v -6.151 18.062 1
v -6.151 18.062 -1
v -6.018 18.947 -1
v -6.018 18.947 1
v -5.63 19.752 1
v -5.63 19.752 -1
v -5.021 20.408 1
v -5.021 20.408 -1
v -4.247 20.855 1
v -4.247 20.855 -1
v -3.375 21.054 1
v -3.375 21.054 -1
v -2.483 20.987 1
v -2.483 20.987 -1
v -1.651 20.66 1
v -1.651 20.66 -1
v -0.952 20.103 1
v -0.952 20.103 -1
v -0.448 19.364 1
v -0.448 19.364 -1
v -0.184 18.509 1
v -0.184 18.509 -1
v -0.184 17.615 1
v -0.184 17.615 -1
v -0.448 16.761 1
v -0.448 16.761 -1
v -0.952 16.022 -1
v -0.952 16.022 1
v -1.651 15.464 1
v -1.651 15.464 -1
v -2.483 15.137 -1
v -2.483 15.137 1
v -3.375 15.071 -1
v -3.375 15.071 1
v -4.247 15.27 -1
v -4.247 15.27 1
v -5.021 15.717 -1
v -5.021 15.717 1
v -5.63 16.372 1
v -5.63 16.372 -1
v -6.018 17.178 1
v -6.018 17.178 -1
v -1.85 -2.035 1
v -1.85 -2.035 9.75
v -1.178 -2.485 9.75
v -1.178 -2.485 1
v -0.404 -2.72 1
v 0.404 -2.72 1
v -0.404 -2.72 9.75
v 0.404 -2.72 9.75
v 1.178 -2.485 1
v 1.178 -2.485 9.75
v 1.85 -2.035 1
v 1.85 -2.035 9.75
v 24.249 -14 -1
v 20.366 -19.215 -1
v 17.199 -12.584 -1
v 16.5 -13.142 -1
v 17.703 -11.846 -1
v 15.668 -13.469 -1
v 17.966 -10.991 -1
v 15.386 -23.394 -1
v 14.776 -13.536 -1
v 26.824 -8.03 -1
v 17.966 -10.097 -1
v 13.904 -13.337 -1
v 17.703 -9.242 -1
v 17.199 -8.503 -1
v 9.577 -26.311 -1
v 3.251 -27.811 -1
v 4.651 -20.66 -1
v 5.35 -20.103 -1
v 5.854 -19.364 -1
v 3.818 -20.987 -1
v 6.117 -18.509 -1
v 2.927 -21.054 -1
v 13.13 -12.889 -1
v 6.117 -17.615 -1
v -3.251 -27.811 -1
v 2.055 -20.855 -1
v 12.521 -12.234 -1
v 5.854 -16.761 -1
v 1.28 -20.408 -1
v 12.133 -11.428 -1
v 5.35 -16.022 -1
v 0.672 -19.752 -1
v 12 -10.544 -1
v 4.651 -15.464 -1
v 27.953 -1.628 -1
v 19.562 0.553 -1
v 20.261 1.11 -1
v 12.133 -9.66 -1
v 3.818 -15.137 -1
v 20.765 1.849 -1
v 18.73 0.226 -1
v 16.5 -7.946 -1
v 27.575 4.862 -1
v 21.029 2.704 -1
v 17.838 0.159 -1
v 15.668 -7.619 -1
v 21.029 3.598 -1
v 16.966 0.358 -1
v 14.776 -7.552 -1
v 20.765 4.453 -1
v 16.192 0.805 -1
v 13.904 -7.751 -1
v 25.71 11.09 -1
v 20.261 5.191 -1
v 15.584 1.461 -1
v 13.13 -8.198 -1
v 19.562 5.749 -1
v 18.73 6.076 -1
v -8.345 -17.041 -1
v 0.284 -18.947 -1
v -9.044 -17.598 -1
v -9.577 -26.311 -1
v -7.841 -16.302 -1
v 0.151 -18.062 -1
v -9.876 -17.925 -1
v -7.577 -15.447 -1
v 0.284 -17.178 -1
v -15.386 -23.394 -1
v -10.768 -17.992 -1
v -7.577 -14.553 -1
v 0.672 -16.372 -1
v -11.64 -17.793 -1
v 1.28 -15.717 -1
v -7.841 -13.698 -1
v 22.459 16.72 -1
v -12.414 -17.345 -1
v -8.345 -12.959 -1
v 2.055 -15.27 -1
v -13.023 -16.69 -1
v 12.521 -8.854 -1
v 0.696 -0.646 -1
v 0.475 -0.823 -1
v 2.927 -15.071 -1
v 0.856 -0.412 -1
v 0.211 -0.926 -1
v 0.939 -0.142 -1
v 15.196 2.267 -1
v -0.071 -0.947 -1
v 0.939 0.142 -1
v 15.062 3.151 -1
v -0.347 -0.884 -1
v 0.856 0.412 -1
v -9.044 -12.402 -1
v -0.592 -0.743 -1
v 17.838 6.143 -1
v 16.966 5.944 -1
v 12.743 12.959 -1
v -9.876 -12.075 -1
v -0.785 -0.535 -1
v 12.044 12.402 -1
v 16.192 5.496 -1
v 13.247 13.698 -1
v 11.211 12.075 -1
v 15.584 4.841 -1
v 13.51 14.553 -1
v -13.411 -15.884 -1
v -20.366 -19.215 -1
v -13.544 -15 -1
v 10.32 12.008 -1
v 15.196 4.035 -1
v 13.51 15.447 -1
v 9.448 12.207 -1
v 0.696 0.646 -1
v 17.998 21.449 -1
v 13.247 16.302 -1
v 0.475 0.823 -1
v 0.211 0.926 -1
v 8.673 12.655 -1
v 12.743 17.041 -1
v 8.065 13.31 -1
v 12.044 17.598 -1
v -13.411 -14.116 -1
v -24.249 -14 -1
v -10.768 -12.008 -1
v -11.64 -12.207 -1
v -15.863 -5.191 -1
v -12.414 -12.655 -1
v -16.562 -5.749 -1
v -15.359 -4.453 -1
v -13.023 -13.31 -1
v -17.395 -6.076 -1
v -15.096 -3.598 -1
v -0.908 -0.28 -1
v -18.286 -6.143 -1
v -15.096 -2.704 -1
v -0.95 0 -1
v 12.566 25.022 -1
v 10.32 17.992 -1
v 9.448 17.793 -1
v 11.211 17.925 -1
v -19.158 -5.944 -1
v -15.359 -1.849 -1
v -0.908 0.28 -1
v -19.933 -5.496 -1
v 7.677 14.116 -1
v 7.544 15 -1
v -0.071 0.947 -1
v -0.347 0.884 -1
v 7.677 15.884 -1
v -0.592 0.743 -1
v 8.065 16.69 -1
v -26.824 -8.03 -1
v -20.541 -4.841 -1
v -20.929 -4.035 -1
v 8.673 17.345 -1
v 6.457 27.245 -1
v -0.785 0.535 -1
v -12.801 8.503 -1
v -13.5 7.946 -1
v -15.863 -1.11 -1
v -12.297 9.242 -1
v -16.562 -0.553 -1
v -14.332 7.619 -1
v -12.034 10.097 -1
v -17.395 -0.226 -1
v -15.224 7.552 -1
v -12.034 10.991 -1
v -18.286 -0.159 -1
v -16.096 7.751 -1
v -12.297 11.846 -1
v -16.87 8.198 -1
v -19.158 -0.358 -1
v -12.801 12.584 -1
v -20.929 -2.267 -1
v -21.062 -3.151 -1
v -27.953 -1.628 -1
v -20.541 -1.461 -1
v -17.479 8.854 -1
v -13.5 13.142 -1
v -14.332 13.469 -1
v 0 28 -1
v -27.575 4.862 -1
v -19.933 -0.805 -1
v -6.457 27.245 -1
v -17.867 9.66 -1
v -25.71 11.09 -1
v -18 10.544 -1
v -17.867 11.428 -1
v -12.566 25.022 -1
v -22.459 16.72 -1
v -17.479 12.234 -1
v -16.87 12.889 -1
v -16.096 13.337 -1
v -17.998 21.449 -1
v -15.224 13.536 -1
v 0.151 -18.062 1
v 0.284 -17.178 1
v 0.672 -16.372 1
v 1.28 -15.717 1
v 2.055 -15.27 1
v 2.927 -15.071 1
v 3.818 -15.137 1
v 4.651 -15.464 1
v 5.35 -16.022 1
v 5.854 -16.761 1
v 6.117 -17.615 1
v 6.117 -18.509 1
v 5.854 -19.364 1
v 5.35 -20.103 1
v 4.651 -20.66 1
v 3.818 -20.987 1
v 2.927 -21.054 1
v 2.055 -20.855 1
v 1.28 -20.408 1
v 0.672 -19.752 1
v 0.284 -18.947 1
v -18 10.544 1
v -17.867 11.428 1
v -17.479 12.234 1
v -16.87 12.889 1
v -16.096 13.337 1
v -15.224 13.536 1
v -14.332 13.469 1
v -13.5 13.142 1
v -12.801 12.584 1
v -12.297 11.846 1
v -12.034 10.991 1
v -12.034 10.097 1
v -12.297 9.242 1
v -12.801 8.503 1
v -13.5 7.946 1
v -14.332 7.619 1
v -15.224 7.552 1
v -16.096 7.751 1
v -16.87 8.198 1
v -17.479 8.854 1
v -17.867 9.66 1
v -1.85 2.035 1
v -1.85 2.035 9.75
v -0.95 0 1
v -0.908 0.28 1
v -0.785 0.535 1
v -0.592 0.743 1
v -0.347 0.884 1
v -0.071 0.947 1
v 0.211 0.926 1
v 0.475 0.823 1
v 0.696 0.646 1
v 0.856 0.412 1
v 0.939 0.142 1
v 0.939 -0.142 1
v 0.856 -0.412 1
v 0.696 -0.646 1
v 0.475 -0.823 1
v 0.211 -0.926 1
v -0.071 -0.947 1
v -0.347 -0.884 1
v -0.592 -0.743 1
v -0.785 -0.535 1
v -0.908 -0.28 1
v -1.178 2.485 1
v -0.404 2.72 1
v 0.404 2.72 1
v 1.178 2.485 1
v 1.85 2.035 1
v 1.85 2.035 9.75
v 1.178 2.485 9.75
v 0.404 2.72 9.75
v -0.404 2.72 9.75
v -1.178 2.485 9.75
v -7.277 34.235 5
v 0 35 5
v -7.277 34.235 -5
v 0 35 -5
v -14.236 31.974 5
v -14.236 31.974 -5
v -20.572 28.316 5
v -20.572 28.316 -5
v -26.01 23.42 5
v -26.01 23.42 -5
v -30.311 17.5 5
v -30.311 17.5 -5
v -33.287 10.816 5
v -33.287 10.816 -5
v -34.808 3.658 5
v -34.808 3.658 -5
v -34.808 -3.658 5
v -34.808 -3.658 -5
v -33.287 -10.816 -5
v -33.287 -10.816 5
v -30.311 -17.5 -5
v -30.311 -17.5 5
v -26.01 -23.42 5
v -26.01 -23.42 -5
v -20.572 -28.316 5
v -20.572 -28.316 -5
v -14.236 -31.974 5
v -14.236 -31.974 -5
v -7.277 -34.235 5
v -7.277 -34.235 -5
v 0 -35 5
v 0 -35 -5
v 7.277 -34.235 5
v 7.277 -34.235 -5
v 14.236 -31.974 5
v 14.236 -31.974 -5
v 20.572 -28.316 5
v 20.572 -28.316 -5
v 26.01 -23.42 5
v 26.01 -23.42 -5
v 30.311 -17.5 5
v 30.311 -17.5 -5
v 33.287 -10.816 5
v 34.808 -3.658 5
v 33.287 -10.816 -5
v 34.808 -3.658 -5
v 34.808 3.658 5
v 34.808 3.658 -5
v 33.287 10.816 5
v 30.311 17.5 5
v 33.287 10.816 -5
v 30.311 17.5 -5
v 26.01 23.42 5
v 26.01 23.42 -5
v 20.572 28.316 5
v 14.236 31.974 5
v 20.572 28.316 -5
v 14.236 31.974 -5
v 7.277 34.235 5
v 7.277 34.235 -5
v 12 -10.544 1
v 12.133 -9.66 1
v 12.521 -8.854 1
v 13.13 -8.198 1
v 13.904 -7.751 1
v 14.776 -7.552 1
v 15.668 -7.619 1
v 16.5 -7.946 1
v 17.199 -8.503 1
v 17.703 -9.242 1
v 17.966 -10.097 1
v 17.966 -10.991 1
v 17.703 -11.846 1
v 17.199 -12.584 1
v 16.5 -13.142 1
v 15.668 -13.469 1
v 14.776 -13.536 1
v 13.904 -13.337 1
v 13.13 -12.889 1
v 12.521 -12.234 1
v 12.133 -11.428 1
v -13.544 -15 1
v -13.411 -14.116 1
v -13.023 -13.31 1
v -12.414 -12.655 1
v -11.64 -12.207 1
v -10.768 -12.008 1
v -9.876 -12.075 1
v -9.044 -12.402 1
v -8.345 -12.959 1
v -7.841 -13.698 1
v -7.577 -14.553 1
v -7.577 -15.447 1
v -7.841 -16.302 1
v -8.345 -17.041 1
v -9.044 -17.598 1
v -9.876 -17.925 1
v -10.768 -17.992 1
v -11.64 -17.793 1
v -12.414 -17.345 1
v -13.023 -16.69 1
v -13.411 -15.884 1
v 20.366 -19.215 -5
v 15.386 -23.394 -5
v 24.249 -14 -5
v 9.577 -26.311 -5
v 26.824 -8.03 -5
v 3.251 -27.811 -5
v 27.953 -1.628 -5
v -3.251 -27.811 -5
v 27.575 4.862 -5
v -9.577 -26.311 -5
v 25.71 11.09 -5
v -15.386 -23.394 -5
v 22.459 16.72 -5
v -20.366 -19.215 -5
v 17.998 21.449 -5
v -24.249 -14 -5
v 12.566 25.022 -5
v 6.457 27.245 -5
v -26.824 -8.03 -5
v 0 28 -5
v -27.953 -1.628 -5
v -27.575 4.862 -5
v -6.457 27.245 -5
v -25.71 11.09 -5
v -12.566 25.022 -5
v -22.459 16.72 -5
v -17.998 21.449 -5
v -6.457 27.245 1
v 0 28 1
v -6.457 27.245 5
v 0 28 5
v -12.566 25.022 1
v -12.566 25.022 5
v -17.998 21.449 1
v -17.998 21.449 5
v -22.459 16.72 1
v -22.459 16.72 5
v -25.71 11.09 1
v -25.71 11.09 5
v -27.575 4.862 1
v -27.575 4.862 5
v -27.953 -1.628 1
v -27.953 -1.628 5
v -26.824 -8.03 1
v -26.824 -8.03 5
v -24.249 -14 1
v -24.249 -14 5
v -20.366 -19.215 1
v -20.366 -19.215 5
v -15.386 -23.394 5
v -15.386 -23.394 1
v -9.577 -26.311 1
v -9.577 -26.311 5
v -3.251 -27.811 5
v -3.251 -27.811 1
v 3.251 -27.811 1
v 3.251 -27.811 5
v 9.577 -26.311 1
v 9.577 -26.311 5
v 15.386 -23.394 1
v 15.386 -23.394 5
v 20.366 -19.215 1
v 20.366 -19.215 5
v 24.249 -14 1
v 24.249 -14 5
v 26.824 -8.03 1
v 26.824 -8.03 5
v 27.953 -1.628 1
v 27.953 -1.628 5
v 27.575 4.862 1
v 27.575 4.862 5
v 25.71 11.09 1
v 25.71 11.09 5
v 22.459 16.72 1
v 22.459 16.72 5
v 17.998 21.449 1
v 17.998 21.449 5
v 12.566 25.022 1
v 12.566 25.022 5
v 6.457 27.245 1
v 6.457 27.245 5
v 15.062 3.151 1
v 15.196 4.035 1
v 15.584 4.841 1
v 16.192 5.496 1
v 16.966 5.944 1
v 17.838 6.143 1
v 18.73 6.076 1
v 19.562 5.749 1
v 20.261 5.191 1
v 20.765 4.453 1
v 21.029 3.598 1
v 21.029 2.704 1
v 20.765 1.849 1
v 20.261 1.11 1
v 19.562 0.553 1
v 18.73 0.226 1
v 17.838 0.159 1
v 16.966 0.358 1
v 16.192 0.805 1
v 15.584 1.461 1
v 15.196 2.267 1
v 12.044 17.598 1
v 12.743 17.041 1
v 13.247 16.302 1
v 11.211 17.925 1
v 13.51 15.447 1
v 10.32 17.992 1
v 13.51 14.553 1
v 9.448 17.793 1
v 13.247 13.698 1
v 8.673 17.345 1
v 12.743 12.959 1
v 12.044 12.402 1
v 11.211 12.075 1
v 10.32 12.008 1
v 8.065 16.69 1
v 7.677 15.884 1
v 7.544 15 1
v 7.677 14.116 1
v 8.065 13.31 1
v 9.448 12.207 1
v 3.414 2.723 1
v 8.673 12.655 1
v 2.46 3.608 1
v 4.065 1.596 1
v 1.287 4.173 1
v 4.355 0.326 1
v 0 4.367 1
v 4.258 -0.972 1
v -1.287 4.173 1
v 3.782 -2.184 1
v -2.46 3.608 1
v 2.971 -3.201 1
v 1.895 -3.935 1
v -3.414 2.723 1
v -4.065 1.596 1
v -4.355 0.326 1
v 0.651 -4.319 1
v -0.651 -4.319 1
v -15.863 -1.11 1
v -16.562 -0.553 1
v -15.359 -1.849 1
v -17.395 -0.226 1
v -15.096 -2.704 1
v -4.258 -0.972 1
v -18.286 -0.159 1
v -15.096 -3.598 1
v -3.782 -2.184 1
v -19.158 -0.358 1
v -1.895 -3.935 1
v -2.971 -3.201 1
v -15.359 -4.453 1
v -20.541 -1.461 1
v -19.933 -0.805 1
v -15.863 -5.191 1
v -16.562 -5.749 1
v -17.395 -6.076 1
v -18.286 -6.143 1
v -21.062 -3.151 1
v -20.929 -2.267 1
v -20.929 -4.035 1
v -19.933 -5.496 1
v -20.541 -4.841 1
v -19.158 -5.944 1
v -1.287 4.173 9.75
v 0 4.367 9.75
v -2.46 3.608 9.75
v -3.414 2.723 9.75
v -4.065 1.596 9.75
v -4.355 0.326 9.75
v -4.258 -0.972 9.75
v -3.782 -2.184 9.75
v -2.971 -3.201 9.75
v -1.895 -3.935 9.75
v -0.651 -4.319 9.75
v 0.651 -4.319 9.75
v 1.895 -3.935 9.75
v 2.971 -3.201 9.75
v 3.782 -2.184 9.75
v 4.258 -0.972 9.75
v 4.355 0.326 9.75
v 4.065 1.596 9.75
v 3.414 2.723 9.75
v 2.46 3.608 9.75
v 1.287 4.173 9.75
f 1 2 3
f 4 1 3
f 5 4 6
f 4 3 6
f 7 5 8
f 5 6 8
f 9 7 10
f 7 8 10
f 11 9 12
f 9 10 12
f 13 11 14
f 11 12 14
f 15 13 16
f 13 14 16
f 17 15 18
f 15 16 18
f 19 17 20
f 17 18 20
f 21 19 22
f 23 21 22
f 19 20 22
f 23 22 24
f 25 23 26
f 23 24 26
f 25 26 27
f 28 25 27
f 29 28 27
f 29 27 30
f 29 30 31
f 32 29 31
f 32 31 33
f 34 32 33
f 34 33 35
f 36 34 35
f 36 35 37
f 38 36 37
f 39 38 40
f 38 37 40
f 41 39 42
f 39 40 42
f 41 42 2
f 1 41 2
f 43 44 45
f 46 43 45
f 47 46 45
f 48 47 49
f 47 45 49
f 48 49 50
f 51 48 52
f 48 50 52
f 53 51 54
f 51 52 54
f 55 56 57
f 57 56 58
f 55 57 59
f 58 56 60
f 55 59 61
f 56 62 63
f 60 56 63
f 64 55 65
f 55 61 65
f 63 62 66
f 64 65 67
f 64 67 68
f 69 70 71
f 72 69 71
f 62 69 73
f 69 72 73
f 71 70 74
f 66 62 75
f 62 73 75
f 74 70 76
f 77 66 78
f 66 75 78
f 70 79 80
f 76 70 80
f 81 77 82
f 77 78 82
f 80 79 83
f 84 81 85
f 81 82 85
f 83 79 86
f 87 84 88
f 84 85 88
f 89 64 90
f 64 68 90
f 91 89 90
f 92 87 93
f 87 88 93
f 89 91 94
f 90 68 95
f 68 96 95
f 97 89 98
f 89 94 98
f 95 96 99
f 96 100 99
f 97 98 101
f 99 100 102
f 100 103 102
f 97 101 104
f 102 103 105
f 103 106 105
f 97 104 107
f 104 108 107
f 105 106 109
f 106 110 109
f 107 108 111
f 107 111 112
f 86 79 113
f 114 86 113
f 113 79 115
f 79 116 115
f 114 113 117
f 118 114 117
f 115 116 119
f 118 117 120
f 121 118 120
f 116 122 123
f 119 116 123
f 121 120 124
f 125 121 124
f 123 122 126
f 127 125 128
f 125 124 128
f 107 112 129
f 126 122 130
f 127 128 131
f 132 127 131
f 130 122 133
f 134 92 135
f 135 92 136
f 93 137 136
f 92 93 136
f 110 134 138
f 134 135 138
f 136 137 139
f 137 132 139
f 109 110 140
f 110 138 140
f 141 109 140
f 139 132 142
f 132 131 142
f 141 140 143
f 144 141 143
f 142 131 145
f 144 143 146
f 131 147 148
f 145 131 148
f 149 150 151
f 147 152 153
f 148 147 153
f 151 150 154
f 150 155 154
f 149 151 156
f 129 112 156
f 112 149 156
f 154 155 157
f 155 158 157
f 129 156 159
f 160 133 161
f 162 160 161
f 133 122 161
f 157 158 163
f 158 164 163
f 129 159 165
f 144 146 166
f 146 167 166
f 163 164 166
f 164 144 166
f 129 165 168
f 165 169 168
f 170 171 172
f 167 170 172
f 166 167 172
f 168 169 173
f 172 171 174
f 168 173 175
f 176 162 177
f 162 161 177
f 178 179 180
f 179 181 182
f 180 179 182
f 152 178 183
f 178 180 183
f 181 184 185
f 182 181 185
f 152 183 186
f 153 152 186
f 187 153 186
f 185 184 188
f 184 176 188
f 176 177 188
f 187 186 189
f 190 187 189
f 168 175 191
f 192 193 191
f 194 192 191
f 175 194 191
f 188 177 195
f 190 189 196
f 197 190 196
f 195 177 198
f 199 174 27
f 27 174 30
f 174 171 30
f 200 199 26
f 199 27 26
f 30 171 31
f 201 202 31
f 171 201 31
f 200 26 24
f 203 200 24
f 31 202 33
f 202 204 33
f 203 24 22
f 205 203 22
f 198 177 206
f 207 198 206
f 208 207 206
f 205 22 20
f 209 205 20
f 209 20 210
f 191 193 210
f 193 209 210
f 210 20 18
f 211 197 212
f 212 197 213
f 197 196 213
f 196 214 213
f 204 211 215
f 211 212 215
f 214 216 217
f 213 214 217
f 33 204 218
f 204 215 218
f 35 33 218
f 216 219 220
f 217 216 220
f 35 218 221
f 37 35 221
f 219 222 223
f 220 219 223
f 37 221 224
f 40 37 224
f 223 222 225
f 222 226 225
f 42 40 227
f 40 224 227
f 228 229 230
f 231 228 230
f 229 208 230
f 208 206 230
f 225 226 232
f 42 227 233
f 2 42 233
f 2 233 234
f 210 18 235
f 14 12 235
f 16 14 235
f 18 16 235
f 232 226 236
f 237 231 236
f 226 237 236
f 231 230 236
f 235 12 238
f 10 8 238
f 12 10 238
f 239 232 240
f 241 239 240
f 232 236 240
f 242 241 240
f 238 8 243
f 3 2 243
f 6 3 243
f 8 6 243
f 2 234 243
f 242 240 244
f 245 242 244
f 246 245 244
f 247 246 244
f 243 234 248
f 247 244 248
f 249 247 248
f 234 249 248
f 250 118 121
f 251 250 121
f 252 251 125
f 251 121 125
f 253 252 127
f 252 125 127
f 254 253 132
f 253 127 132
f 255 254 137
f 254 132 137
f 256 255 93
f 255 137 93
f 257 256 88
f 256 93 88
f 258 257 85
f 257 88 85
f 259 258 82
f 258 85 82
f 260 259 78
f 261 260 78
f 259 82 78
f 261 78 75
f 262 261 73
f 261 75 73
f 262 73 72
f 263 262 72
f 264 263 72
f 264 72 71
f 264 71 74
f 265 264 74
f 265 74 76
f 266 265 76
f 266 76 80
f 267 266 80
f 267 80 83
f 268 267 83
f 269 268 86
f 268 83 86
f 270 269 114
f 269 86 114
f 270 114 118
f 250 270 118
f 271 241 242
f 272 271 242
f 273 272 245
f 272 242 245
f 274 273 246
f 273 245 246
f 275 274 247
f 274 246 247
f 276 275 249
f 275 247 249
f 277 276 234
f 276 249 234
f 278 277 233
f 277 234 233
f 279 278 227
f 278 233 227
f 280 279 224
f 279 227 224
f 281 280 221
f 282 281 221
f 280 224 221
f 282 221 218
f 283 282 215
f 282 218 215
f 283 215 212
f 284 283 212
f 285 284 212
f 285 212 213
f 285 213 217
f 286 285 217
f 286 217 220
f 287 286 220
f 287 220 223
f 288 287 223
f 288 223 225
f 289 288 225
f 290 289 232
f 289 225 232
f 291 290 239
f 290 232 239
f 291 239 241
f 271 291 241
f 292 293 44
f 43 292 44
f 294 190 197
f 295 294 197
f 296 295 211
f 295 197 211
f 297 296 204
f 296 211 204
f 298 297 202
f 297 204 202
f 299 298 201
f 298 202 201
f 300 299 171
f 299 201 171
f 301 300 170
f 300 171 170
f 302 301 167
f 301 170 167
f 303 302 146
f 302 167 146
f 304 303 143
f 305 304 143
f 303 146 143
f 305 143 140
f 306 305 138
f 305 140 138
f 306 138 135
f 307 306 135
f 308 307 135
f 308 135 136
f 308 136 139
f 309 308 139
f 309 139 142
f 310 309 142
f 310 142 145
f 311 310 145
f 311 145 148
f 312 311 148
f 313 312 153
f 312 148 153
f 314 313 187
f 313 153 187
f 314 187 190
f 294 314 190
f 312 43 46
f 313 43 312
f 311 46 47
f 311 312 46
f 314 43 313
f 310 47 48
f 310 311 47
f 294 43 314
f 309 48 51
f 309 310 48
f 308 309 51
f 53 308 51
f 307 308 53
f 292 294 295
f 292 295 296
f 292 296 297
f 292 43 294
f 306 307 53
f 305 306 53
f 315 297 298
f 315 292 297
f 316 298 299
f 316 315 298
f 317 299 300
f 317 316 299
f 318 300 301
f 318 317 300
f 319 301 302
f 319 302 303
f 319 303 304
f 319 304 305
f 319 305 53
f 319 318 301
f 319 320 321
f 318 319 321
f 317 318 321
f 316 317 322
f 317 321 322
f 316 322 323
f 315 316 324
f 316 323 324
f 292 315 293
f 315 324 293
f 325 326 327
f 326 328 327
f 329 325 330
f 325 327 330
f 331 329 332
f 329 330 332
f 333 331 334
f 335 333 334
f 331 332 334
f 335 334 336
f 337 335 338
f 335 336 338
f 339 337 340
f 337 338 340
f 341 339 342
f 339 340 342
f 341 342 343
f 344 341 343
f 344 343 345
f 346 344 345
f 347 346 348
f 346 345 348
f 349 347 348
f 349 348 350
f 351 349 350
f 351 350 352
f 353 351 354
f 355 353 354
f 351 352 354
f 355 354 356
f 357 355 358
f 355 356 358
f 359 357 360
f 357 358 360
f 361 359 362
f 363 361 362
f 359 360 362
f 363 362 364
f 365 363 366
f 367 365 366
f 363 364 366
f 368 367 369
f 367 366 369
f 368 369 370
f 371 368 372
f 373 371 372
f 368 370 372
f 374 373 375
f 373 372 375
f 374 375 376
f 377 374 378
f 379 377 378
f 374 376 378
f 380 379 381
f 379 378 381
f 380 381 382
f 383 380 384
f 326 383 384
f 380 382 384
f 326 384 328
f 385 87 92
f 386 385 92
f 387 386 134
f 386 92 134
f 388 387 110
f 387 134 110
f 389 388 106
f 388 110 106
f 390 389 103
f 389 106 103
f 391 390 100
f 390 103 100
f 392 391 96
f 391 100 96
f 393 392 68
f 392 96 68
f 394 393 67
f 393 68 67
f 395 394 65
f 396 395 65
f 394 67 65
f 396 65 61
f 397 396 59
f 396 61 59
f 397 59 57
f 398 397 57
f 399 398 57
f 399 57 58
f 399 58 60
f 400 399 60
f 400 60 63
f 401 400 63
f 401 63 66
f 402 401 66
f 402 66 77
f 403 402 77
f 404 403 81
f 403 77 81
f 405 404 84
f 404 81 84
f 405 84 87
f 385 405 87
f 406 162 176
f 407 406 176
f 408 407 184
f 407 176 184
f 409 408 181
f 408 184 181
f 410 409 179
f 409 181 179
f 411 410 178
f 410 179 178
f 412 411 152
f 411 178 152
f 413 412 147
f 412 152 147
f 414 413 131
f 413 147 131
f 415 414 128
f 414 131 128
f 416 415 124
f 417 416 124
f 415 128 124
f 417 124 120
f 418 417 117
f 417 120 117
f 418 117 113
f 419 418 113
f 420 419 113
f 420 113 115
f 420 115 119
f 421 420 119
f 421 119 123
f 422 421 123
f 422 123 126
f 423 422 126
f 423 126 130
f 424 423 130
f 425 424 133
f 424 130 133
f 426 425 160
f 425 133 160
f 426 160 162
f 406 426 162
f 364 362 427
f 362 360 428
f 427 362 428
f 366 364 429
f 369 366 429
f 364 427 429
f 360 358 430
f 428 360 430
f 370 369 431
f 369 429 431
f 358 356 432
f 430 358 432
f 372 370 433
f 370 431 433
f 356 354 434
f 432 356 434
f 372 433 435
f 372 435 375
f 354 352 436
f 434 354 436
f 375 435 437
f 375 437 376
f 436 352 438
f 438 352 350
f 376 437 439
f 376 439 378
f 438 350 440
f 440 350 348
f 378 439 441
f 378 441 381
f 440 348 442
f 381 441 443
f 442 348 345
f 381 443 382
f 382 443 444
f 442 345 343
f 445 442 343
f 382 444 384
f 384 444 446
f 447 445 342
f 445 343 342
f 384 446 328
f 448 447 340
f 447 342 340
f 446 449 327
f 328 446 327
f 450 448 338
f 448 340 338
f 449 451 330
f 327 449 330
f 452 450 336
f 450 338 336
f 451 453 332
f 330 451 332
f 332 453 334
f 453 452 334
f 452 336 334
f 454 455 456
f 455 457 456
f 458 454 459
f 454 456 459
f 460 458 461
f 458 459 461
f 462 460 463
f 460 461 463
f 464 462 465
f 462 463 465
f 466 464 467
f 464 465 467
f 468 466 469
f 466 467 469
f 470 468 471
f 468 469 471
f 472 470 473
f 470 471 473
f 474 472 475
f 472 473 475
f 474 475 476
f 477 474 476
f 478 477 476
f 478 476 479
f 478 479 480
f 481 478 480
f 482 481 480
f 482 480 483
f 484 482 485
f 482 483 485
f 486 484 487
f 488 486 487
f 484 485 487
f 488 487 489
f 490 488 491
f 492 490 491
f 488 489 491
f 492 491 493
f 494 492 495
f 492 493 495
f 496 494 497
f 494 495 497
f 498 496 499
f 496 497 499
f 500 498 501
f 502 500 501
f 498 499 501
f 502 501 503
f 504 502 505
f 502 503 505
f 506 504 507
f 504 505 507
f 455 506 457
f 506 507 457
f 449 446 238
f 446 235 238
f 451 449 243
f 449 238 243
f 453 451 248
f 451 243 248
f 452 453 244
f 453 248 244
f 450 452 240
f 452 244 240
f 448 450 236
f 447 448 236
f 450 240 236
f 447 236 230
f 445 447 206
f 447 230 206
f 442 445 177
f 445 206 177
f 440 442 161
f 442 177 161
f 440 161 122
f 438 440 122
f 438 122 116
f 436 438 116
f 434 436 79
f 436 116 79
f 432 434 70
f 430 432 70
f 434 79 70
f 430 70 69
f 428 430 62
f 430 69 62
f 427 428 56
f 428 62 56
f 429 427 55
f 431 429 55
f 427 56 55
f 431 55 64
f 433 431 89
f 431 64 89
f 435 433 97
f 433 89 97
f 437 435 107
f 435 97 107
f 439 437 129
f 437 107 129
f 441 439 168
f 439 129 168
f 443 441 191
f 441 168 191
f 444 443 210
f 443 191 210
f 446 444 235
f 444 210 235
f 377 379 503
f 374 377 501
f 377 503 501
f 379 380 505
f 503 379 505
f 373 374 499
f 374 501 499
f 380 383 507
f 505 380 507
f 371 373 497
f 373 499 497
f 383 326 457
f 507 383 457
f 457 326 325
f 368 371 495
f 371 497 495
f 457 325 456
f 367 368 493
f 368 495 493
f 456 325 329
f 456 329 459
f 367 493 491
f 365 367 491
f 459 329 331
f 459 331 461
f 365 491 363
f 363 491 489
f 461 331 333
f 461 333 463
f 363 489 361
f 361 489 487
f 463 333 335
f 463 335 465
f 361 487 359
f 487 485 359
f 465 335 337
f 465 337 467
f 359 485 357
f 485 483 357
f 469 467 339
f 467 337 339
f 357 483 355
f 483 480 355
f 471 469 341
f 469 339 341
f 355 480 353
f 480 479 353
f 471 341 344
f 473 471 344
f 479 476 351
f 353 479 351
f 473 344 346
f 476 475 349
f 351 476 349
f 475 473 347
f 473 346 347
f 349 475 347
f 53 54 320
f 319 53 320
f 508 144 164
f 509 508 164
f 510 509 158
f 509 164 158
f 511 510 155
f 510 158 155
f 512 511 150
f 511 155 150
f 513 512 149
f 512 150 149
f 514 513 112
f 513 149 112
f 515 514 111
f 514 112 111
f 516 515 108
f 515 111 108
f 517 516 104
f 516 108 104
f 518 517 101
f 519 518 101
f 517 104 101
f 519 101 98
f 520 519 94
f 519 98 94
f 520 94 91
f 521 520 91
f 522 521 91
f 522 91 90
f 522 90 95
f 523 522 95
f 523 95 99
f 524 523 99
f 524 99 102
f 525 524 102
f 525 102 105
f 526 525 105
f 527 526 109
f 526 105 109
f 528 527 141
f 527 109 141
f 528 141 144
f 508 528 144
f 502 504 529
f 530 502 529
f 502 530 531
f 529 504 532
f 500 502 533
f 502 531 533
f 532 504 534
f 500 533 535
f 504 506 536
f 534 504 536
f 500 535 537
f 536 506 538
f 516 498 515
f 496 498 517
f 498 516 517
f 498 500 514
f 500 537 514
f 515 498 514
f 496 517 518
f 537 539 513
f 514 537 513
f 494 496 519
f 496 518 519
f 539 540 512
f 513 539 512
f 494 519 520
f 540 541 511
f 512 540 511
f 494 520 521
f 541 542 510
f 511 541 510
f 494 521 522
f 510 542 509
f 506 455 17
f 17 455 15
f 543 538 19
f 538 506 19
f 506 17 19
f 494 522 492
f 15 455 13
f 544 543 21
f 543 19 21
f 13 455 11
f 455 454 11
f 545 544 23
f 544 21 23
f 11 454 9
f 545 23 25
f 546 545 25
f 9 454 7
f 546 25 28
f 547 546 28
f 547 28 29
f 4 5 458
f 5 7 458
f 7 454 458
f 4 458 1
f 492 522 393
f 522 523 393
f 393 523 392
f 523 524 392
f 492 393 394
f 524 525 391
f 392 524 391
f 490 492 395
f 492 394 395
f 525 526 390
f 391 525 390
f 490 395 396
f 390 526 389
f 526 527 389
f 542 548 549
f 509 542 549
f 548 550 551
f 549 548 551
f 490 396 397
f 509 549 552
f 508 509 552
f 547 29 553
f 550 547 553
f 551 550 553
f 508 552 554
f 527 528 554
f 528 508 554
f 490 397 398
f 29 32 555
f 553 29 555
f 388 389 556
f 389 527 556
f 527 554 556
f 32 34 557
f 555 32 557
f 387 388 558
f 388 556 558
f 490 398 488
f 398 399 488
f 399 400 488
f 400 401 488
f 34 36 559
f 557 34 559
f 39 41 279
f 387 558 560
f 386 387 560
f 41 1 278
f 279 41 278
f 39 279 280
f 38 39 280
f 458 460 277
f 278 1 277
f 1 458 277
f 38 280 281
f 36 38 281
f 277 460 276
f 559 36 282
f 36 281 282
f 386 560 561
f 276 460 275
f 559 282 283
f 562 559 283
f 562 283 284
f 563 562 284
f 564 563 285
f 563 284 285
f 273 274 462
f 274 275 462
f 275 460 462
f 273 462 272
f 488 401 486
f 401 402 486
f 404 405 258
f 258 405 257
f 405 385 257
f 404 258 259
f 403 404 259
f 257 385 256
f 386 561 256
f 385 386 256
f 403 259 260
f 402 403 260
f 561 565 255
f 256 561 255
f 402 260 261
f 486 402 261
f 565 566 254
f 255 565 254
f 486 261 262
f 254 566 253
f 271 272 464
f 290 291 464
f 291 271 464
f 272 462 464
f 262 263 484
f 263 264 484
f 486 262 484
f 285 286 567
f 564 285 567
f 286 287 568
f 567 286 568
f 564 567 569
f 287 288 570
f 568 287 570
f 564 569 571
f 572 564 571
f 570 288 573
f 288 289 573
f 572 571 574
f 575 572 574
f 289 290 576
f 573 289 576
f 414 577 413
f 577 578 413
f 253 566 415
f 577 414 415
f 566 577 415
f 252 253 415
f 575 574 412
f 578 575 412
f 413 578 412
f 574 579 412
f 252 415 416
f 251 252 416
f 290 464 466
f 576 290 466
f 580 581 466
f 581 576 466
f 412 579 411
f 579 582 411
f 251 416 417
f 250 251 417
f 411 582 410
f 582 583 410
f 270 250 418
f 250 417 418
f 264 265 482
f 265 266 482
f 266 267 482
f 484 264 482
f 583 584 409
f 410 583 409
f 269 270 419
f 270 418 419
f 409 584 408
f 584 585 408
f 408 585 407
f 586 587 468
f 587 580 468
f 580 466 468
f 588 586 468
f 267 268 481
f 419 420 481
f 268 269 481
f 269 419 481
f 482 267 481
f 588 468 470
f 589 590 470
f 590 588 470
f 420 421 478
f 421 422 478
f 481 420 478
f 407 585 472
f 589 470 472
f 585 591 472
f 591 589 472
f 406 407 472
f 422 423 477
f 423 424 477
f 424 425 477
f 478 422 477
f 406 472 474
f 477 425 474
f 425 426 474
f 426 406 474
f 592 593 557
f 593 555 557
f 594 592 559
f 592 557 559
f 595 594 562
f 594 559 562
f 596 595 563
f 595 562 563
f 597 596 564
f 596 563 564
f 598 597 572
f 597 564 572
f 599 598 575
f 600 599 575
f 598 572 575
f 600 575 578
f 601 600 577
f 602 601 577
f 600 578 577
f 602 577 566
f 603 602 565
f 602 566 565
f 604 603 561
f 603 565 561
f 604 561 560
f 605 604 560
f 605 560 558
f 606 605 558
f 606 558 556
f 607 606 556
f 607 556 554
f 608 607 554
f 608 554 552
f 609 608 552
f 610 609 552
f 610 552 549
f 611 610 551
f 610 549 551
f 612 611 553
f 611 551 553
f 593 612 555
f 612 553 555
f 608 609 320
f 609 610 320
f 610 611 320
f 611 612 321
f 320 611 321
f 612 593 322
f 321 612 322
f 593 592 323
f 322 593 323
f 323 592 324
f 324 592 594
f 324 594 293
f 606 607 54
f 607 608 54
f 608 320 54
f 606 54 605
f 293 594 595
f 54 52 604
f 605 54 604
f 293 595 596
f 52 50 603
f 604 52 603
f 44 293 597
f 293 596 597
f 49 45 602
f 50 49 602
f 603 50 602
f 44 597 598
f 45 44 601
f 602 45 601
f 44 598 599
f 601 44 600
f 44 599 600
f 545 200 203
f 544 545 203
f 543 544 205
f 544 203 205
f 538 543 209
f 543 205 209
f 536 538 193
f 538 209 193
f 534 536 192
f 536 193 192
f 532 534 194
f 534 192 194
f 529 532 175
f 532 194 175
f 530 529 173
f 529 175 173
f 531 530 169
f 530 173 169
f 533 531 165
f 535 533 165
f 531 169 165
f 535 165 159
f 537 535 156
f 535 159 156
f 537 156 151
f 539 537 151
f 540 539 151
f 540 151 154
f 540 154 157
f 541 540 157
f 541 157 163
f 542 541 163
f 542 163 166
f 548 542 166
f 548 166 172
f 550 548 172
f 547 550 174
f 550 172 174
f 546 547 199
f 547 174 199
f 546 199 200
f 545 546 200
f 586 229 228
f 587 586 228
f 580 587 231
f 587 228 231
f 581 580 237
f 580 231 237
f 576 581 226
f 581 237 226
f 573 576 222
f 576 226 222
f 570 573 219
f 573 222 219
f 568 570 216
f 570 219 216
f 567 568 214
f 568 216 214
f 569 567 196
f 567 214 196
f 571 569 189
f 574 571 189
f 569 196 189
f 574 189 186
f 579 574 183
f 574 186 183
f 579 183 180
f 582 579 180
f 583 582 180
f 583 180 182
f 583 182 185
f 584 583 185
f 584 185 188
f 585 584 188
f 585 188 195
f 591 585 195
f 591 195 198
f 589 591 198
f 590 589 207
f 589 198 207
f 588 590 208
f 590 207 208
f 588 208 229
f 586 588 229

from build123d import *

# Parameters (mm, degrees)
SKETCH2_R          = 3
CUT_EXTRUDE1_DEPTH = 2
CUT_EXTRUDE2_DEPTH = 8.75
SKETCH4_R          = 0.95
CUT_EXTRUDE3_DEPTH = 2


with BuildPart() as part:
    # Sketch1 → Revolve1 (revolve)
    with BuildSketch(Plane(origin=(0, 0, 0), x_dir=(0, 0, -1), z_dir=(1, 0, 0))):
        Polygon((0, 0), (-9.75, 0), (-9.75, 4.367299354), (-1, 4.367299354), (-1, 28), (-5, 28), (-5, 35), (5, 35), (5, 28), (1, 28), (1, 0), align=None)
    revolve(axis=Axis((0, 0, 0), (0, 0, 1)))

    # Sketch2 → Cut-Extrude1 (cut)
    with BuildSketch(Plane(origin=(0, 0, -1), x_dir=(-1, 0, 0), z_dir=(0, 0, -1))):
        with Locations((-10.543910988, 15)):
            Circle(SKETCH2_R)
        with Locations((3.150930758, 18.062272677)):
            Circle(SKETCH2_R)
        with Locations((15, 10.543910988)):
            Circle(SKETCH2_R)
        with Locations((18.062272677, -3.150930758)):
            Circle(SKETCH2_R)
        with Locations((10.543910988, -15)):
            Circle(SKETCH2_R)
        with Locations((-3.150930758, -18.062272677)):
            Circle(SKETCH2_R)
        with Locations((-15, -10.543910988)):
            Circle(SKETCH2_R)
        with Locations((-18.062272677, 3.150930758)):
            Circle(SKETCH2_R)
    extrude(amount=-CUT_EXTRUDE1_DEPTH, mode=Mode.SUBTRACT)

    # Sketch3 → Cut-Extrude2 (cut)
    with BuildSketch(Plane.XY.offset(9.75)):
        with BuildLine():
            Line((1.85, -2.034698995), (1.85, 2.034698995))
            ThreePointArc((1.85, 2.034698995), (0, 2.75), (-1.85, 2.034698995))
            Line((-1.85, 2.034698995), (-1.85, -2.034698995))
            ThreePointArc((-1.85, -2.034698995), (0, -2.75), (1.85, -2.034698995))
        make_face()
    extrude(amount=-CUT_EXTRUDE2_DEPTH, mode=Mode.SUBTRACT)

    # Sketch4 → Cut-Extrude3 (cut)
    with BuildSketch(Plane(origin=(0, 0, -1), x_dir=(-1, 0, 0), z_dir=(0, 0, -1))):
        Circle(SKETCH4_R)
    extrude(amount=-CUT_EXTRUDE3_DEPTH, mode=Mode.SUBTRACT)


solid = part.part
